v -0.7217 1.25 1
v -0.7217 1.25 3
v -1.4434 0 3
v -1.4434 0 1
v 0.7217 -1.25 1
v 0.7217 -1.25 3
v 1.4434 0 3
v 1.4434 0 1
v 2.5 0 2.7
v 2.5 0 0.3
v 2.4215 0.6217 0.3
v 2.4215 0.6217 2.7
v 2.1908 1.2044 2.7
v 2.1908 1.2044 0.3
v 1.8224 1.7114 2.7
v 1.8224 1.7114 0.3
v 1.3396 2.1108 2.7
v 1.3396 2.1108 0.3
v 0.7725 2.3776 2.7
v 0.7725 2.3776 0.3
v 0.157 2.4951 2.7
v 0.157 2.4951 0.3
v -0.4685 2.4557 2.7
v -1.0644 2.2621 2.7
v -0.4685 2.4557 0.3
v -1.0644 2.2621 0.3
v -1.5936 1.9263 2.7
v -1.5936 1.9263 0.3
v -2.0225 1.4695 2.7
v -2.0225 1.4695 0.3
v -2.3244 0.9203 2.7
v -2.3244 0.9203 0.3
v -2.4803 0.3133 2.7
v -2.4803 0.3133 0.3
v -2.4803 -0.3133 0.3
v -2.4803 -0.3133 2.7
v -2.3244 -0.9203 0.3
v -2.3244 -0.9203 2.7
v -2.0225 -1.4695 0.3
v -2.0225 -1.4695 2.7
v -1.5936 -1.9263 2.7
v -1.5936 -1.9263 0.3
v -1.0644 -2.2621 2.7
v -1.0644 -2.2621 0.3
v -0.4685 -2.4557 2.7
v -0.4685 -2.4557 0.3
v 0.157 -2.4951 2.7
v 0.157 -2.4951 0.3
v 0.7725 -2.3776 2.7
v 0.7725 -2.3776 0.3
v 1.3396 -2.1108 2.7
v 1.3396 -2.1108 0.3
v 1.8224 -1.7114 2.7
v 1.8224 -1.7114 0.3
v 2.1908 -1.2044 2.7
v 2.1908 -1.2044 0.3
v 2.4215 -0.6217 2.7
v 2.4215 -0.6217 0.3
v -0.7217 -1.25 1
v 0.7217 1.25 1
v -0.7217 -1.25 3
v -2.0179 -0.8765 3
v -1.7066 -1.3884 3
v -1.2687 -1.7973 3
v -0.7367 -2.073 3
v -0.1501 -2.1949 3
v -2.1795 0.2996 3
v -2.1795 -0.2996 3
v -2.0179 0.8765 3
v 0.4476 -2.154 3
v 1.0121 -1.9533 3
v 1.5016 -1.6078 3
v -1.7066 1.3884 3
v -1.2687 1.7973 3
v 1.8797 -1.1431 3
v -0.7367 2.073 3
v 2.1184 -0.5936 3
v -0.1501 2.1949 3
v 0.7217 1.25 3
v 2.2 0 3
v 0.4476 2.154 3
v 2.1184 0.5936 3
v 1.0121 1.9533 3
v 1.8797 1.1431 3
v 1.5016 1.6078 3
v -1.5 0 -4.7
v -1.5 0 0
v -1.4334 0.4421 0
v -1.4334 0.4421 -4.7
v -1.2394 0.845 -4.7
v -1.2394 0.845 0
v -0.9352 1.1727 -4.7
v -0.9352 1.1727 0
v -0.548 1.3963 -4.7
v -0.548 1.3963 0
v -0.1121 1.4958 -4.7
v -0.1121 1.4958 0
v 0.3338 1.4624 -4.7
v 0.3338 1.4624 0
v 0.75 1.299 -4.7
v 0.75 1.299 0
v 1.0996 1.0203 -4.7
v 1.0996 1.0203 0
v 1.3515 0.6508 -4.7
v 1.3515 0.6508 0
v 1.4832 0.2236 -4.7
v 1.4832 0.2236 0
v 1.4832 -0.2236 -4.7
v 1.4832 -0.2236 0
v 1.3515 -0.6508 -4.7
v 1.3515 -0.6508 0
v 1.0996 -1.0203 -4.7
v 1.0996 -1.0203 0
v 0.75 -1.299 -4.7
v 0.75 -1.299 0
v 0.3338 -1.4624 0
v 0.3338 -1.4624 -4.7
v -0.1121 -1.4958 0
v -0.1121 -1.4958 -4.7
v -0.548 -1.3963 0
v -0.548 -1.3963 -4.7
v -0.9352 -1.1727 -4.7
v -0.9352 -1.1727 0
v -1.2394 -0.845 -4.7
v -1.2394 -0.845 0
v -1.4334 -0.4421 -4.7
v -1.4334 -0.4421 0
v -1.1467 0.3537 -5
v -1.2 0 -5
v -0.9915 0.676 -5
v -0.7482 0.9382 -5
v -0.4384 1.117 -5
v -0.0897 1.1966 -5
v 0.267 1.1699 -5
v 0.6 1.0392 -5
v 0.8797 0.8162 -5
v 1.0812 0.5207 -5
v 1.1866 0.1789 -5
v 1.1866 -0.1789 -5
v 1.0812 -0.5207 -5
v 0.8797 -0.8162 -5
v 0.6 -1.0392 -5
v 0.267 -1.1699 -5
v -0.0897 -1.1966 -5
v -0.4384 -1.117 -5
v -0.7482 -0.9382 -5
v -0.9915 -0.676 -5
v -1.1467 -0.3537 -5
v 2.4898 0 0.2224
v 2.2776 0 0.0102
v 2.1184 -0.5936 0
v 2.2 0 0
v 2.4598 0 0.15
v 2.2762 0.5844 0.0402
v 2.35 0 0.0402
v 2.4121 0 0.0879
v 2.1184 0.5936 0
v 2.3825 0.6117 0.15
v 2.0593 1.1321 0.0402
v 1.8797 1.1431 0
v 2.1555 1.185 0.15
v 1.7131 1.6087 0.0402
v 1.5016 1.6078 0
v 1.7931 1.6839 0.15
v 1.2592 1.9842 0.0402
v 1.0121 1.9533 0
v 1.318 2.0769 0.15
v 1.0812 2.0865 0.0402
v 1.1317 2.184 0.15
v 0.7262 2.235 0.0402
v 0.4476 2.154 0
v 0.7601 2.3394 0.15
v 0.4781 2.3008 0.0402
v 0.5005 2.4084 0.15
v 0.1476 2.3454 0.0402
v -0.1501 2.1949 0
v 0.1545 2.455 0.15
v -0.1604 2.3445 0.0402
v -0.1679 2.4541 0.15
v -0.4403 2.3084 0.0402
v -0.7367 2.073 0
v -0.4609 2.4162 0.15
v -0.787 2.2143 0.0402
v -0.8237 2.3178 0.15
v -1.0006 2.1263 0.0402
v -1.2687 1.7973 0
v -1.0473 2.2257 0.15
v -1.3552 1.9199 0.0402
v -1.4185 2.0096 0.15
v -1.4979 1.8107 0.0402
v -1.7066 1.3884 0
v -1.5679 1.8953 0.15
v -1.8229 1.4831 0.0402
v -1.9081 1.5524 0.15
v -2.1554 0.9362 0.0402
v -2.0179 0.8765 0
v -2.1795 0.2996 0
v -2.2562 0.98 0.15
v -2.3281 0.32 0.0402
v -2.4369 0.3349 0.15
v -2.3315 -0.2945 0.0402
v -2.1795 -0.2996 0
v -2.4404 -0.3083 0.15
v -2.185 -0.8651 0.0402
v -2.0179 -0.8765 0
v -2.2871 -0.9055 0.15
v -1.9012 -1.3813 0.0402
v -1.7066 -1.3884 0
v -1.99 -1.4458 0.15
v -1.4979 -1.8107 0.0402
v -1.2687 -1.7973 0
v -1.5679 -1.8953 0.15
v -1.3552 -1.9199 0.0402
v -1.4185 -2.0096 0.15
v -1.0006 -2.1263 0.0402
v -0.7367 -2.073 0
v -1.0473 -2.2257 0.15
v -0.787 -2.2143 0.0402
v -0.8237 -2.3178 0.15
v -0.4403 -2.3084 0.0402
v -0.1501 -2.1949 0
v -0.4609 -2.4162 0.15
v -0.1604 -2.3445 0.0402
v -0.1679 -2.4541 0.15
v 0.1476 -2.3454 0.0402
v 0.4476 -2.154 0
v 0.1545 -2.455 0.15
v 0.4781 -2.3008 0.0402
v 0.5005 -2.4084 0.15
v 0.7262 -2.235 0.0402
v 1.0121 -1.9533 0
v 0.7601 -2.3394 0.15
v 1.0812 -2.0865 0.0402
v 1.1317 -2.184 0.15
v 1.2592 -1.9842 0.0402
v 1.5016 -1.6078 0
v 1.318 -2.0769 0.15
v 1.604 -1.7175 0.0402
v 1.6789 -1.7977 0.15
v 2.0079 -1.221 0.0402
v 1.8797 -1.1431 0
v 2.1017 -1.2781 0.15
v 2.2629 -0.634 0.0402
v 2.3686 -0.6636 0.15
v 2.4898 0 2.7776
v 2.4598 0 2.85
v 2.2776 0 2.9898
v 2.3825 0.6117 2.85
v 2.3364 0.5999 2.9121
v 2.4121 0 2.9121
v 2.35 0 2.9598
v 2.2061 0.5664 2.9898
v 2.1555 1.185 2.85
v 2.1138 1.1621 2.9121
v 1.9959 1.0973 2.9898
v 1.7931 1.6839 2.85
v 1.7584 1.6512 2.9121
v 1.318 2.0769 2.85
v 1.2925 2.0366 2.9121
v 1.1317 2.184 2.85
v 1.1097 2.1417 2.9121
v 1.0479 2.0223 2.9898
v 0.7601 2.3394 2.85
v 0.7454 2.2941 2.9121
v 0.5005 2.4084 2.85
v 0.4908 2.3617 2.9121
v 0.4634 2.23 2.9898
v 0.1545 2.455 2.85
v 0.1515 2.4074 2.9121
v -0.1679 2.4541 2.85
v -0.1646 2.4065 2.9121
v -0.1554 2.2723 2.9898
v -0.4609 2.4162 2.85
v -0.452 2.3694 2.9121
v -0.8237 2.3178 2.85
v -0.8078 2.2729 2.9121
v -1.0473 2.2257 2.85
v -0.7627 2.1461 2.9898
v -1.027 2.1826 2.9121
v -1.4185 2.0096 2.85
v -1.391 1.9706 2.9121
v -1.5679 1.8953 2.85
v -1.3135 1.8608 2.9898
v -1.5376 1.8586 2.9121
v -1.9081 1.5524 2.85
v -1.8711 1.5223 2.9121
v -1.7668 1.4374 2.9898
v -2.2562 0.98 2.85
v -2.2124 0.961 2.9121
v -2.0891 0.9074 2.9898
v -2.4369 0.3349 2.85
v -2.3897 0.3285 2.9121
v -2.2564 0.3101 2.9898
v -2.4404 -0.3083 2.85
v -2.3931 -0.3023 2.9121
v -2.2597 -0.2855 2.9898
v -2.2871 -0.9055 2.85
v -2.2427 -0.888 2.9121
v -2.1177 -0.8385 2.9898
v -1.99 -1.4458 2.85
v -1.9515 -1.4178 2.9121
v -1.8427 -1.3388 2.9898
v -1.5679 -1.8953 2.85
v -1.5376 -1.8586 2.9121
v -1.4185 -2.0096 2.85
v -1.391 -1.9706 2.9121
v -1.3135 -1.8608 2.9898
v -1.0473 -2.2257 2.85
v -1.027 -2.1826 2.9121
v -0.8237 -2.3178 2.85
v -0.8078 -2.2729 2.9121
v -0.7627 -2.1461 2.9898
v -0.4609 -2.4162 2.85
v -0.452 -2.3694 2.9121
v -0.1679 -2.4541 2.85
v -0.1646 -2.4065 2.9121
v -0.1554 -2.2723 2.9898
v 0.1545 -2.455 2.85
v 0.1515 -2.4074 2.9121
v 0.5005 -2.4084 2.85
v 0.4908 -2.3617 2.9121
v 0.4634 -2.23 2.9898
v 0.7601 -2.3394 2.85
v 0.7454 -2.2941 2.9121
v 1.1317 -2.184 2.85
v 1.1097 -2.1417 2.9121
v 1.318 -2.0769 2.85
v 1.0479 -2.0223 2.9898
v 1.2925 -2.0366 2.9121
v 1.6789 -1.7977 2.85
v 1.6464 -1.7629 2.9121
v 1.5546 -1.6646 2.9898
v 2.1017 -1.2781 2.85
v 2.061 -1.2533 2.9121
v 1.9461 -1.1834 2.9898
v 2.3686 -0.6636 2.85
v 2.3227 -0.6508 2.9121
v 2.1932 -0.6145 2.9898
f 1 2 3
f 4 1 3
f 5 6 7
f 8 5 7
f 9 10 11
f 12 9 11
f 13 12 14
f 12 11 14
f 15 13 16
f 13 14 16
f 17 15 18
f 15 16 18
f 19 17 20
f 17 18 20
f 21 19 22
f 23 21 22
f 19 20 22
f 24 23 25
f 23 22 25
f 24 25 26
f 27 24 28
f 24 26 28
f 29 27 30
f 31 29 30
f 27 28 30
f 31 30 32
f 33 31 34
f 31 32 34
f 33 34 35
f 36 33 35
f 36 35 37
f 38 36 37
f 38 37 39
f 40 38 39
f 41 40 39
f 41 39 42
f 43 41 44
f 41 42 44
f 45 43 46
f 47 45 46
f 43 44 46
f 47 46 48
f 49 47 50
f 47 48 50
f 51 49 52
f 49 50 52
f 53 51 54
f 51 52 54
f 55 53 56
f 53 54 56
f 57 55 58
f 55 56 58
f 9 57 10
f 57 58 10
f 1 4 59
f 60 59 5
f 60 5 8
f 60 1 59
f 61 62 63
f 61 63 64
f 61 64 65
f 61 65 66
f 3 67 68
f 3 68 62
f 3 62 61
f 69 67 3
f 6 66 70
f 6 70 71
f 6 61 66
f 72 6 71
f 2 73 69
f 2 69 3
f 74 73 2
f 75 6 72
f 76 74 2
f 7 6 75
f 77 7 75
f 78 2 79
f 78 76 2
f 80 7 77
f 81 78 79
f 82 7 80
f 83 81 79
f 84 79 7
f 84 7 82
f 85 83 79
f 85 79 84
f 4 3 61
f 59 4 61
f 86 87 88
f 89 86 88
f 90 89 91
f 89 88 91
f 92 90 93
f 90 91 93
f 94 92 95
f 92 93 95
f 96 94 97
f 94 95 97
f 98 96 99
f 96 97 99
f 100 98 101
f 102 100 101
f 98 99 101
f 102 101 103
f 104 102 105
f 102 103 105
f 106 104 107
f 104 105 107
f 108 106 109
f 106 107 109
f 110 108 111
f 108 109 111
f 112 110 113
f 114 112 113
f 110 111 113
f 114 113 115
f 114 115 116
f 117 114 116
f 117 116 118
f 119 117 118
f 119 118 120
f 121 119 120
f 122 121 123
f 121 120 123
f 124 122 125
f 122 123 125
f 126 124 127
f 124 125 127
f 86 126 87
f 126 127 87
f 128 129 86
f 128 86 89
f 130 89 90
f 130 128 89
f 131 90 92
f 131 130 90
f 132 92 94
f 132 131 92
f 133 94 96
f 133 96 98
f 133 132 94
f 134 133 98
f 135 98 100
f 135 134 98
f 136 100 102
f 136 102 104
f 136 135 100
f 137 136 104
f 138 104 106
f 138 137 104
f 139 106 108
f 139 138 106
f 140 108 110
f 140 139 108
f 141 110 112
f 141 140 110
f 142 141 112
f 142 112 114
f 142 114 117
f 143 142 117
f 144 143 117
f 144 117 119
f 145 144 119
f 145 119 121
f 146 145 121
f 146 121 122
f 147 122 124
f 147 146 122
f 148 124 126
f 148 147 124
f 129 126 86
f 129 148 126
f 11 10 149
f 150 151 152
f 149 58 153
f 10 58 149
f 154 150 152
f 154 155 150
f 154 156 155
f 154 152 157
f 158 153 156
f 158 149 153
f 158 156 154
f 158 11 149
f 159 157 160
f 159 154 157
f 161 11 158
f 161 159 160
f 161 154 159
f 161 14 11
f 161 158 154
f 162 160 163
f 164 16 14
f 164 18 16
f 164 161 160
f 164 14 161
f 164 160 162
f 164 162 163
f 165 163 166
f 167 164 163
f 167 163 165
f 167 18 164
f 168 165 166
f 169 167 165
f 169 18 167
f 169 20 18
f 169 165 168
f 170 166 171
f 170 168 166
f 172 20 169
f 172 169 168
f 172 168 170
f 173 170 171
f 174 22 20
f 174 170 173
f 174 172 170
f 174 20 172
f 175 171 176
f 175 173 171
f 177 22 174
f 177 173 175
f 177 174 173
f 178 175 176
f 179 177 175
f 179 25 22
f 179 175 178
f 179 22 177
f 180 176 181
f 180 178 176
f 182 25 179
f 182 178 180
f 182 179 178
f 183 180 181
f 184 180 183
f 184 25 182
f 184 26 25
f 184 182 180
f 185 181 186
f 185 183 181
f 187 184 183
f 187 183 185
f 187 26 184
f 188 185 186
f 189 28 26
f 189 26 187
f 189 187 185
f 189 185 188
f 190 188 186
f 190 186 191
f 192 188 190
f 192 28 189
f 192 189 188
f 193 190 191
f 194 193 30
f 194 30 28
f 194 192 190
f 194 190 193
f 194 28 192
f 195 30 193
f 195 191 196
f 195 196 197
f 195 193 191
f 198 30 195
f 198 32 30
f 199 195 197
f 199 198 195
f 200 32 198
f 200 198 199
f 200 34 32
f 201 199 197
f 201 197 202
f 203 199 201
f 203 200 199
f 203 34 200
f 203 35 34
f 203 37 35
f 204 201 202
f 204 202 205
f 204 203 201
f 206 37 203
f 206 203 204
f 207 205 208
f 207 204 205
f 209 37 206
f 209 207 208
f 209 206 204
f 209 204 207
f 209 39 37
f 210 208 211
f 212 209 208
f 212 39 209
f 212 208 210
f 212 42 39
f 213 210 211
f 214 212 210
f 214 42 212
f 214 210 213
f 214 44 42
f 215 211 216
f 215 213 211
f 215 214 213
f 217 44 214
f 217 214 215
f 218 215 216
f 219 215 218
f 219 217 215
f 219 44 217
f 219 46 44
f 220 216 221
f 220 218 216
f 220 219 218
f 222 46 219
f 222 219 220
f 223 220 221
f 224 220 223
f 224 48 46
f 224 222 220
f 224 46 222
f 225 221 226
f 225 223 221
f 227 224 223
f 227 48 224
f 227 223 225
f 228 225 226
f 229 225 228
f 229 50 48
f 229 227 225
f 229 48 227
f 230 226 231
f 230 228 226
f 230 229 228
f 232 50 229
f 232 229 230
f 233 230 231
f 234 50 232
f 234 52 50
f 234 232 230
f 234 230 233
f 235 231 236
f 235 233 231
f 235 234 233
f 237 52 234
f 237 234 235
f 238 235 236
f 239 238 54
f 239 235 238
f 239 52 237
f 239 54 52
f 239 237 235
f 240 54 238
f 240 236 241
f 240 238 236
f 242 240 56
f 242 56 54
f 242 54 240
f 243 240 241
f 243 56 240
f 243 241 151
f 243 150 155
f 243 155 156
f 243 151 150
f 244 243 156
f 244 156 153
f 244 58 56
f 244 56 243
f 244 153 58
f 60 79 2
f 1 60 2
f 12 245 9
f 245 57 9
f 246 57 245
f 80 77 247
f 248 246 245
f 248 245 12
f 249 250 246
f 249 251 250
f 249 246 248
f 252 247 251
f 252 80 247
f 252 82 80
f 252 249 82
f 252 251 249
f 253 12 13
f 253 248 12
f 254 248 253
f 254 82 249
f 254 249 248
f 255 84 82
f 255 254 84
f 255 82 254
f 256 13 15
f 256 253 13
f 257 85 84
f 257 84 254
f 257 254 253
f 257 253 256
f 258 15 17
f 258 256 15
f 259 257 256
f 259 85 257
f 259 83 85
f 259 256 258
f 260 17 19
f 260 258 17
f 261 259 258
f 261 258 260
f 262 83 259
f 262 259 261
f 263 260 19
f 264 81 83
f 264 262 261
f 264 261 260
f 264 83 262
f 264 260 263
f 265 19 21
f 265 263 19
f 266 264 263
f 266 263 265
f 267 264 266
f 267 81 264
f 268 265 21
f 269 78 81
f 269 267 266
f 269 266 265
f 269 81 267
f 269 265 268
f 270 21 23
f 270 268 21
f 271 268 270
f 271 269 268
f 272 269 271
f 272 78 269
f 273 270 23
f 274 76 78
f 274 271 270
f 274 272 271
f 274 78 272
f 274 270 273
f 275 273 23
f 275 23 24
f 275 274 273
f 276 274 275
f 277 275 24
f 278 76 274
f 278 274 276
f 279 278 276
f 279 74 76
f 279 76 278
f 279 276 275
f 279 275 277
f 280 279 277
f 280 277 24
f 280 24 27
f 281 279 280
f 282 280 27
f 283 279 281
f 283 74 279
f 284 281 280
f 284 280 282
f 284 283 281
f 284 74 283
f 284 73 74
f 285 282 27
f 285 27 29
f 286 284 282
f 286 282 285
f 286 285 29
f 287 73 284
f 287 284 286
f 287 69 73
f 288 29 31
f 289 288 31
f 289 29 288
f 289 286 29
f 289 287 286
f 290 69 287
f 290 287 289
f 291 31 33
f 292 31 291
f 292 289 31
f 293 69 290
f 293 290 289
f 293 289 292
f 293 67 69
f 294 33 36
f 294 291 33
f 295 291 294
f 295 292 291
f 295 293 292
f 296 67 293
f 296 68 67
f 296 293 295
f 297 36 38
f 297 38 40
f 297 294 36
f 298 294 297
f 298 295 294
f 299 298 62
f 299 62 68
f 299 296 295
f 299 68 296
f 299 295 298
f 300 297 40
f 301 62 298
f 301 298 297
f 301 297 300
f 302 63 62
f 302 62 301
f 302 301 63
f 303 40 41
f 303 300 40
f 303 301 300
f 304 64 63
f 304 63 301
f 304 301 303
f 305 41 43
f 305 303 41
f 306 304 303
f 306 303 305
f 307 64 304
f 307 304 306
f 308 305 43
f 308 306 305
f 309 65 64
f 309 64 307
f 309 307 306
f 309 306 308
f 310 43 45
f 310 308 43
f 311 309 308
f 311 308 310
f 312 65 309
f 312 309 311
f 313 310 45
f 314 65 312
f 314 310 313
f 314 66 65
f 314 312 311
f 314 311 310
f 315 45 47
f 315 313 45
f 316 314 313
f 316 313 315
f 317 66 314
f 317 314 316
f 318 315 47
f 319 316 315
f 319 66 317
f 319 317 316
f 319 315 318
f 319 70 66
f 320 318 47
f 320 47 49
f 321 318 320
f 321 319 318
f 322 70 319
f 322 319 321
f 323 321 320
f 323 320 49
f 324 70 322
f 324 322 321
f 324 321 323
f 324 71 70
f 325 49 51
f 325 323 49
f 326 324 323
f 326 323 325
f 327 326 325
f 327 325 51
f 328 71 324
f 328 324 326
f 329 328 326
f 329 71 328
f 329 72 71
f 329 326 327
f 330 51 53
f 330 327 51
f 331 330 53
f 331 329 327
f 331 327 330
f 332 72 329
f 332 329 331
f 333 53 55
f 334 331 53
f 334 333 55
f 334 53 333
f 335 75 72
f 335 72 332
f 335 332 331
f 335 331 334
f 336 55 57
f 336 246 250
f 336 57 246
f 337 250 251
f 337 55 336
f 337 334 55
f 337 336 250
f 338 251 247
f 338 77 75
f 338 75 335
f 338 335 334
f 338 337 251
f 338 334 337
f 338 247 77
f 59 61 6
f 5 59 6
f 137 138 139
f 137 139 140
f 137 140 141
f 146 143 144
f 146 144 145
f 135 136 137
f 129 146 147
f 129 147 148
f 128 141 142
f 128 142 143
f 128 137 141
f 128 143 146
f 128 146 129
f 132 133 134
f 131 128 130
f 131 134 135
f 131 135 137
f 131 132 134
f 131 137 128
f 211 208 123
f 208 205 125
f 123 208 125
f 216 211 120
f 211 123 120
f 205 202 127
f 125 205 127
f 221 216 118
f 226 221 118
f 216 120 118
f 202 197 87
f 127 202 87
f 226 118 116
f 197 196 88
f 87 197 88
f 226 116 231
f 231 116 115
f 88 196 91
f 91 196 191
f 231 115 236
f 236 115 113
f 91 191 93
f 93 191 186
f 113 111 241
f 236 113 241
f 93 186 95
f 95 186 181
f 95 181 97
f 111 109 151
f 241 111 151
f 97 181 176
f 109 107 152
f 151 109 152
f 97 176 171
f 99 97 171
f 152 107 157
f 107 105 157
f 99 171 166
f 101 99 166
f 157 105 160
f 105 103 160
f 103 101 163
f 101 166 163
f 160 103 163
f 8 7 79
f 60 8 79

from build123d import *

# Parameters (mm, degrees)
SKETCH_1_R          = 2.5
EXTRUDE_1_DEPTH     = 3
SKETCH_2_R          = 1.5
EXTRUDE_2_DEPTH     = 5
CUT_EXTRUDE_1_DEPTH = 2
CHAMFER_1_SIZE      = 0.3
FILLET_1_R          = 0.3


with BuildPart() as part:
    # 草图1 → 凸台-拉伸1 (new body)
    with BuildSketch(Plane.XY):
        Circle(SKETCH_1_R)
    extrude(amount=EXTRUDE_1_DEPTH)

    # 草图2 → 凸台-拉伸2 (add)
    with BuildSketch(Plane(origin=(0, 0, 0), x_dir=(-1, 0, 0), z_dir=(0, 0, -1))):
        Circle(SKETCH_2_R)
    extrude(amount=EXTRUDE_2_DEPTH)

    # 草图3 → 切除-拉伸1 (cut)
    with BuildSketch(Plane.XY.offset(3)):
        Polygon((1.443375673, 0), (0.721687836, 1.25), (-0.721687836, 1.25), (-1.443375673, 0), (-0.721687836, -1.25), (0.721687836, -1.25), align=None)
    extrude(amount=-CUT_EXTRUDE_1_DEPTH, mode=Mode.SUBTRACT)

    # 倒角1
    chamfer_1_edges = [part.edges().sort_by_distance(p)[0] for p in [
        (1.5, 0, -5),
    ]]
    chamfer(chamfer_1_edges, length=CHAMFER_1_SIZE)

    # 圆角1
    fillet_1_edges = [part.edges().sort_by_distance(p)[0] for p in [
        (-2.5, 0, 0),
        (-2.5, 0, 3),
    ]]
    fillet(fillet_1_edges, radius=FILLET_1_R)


solid = part.part
